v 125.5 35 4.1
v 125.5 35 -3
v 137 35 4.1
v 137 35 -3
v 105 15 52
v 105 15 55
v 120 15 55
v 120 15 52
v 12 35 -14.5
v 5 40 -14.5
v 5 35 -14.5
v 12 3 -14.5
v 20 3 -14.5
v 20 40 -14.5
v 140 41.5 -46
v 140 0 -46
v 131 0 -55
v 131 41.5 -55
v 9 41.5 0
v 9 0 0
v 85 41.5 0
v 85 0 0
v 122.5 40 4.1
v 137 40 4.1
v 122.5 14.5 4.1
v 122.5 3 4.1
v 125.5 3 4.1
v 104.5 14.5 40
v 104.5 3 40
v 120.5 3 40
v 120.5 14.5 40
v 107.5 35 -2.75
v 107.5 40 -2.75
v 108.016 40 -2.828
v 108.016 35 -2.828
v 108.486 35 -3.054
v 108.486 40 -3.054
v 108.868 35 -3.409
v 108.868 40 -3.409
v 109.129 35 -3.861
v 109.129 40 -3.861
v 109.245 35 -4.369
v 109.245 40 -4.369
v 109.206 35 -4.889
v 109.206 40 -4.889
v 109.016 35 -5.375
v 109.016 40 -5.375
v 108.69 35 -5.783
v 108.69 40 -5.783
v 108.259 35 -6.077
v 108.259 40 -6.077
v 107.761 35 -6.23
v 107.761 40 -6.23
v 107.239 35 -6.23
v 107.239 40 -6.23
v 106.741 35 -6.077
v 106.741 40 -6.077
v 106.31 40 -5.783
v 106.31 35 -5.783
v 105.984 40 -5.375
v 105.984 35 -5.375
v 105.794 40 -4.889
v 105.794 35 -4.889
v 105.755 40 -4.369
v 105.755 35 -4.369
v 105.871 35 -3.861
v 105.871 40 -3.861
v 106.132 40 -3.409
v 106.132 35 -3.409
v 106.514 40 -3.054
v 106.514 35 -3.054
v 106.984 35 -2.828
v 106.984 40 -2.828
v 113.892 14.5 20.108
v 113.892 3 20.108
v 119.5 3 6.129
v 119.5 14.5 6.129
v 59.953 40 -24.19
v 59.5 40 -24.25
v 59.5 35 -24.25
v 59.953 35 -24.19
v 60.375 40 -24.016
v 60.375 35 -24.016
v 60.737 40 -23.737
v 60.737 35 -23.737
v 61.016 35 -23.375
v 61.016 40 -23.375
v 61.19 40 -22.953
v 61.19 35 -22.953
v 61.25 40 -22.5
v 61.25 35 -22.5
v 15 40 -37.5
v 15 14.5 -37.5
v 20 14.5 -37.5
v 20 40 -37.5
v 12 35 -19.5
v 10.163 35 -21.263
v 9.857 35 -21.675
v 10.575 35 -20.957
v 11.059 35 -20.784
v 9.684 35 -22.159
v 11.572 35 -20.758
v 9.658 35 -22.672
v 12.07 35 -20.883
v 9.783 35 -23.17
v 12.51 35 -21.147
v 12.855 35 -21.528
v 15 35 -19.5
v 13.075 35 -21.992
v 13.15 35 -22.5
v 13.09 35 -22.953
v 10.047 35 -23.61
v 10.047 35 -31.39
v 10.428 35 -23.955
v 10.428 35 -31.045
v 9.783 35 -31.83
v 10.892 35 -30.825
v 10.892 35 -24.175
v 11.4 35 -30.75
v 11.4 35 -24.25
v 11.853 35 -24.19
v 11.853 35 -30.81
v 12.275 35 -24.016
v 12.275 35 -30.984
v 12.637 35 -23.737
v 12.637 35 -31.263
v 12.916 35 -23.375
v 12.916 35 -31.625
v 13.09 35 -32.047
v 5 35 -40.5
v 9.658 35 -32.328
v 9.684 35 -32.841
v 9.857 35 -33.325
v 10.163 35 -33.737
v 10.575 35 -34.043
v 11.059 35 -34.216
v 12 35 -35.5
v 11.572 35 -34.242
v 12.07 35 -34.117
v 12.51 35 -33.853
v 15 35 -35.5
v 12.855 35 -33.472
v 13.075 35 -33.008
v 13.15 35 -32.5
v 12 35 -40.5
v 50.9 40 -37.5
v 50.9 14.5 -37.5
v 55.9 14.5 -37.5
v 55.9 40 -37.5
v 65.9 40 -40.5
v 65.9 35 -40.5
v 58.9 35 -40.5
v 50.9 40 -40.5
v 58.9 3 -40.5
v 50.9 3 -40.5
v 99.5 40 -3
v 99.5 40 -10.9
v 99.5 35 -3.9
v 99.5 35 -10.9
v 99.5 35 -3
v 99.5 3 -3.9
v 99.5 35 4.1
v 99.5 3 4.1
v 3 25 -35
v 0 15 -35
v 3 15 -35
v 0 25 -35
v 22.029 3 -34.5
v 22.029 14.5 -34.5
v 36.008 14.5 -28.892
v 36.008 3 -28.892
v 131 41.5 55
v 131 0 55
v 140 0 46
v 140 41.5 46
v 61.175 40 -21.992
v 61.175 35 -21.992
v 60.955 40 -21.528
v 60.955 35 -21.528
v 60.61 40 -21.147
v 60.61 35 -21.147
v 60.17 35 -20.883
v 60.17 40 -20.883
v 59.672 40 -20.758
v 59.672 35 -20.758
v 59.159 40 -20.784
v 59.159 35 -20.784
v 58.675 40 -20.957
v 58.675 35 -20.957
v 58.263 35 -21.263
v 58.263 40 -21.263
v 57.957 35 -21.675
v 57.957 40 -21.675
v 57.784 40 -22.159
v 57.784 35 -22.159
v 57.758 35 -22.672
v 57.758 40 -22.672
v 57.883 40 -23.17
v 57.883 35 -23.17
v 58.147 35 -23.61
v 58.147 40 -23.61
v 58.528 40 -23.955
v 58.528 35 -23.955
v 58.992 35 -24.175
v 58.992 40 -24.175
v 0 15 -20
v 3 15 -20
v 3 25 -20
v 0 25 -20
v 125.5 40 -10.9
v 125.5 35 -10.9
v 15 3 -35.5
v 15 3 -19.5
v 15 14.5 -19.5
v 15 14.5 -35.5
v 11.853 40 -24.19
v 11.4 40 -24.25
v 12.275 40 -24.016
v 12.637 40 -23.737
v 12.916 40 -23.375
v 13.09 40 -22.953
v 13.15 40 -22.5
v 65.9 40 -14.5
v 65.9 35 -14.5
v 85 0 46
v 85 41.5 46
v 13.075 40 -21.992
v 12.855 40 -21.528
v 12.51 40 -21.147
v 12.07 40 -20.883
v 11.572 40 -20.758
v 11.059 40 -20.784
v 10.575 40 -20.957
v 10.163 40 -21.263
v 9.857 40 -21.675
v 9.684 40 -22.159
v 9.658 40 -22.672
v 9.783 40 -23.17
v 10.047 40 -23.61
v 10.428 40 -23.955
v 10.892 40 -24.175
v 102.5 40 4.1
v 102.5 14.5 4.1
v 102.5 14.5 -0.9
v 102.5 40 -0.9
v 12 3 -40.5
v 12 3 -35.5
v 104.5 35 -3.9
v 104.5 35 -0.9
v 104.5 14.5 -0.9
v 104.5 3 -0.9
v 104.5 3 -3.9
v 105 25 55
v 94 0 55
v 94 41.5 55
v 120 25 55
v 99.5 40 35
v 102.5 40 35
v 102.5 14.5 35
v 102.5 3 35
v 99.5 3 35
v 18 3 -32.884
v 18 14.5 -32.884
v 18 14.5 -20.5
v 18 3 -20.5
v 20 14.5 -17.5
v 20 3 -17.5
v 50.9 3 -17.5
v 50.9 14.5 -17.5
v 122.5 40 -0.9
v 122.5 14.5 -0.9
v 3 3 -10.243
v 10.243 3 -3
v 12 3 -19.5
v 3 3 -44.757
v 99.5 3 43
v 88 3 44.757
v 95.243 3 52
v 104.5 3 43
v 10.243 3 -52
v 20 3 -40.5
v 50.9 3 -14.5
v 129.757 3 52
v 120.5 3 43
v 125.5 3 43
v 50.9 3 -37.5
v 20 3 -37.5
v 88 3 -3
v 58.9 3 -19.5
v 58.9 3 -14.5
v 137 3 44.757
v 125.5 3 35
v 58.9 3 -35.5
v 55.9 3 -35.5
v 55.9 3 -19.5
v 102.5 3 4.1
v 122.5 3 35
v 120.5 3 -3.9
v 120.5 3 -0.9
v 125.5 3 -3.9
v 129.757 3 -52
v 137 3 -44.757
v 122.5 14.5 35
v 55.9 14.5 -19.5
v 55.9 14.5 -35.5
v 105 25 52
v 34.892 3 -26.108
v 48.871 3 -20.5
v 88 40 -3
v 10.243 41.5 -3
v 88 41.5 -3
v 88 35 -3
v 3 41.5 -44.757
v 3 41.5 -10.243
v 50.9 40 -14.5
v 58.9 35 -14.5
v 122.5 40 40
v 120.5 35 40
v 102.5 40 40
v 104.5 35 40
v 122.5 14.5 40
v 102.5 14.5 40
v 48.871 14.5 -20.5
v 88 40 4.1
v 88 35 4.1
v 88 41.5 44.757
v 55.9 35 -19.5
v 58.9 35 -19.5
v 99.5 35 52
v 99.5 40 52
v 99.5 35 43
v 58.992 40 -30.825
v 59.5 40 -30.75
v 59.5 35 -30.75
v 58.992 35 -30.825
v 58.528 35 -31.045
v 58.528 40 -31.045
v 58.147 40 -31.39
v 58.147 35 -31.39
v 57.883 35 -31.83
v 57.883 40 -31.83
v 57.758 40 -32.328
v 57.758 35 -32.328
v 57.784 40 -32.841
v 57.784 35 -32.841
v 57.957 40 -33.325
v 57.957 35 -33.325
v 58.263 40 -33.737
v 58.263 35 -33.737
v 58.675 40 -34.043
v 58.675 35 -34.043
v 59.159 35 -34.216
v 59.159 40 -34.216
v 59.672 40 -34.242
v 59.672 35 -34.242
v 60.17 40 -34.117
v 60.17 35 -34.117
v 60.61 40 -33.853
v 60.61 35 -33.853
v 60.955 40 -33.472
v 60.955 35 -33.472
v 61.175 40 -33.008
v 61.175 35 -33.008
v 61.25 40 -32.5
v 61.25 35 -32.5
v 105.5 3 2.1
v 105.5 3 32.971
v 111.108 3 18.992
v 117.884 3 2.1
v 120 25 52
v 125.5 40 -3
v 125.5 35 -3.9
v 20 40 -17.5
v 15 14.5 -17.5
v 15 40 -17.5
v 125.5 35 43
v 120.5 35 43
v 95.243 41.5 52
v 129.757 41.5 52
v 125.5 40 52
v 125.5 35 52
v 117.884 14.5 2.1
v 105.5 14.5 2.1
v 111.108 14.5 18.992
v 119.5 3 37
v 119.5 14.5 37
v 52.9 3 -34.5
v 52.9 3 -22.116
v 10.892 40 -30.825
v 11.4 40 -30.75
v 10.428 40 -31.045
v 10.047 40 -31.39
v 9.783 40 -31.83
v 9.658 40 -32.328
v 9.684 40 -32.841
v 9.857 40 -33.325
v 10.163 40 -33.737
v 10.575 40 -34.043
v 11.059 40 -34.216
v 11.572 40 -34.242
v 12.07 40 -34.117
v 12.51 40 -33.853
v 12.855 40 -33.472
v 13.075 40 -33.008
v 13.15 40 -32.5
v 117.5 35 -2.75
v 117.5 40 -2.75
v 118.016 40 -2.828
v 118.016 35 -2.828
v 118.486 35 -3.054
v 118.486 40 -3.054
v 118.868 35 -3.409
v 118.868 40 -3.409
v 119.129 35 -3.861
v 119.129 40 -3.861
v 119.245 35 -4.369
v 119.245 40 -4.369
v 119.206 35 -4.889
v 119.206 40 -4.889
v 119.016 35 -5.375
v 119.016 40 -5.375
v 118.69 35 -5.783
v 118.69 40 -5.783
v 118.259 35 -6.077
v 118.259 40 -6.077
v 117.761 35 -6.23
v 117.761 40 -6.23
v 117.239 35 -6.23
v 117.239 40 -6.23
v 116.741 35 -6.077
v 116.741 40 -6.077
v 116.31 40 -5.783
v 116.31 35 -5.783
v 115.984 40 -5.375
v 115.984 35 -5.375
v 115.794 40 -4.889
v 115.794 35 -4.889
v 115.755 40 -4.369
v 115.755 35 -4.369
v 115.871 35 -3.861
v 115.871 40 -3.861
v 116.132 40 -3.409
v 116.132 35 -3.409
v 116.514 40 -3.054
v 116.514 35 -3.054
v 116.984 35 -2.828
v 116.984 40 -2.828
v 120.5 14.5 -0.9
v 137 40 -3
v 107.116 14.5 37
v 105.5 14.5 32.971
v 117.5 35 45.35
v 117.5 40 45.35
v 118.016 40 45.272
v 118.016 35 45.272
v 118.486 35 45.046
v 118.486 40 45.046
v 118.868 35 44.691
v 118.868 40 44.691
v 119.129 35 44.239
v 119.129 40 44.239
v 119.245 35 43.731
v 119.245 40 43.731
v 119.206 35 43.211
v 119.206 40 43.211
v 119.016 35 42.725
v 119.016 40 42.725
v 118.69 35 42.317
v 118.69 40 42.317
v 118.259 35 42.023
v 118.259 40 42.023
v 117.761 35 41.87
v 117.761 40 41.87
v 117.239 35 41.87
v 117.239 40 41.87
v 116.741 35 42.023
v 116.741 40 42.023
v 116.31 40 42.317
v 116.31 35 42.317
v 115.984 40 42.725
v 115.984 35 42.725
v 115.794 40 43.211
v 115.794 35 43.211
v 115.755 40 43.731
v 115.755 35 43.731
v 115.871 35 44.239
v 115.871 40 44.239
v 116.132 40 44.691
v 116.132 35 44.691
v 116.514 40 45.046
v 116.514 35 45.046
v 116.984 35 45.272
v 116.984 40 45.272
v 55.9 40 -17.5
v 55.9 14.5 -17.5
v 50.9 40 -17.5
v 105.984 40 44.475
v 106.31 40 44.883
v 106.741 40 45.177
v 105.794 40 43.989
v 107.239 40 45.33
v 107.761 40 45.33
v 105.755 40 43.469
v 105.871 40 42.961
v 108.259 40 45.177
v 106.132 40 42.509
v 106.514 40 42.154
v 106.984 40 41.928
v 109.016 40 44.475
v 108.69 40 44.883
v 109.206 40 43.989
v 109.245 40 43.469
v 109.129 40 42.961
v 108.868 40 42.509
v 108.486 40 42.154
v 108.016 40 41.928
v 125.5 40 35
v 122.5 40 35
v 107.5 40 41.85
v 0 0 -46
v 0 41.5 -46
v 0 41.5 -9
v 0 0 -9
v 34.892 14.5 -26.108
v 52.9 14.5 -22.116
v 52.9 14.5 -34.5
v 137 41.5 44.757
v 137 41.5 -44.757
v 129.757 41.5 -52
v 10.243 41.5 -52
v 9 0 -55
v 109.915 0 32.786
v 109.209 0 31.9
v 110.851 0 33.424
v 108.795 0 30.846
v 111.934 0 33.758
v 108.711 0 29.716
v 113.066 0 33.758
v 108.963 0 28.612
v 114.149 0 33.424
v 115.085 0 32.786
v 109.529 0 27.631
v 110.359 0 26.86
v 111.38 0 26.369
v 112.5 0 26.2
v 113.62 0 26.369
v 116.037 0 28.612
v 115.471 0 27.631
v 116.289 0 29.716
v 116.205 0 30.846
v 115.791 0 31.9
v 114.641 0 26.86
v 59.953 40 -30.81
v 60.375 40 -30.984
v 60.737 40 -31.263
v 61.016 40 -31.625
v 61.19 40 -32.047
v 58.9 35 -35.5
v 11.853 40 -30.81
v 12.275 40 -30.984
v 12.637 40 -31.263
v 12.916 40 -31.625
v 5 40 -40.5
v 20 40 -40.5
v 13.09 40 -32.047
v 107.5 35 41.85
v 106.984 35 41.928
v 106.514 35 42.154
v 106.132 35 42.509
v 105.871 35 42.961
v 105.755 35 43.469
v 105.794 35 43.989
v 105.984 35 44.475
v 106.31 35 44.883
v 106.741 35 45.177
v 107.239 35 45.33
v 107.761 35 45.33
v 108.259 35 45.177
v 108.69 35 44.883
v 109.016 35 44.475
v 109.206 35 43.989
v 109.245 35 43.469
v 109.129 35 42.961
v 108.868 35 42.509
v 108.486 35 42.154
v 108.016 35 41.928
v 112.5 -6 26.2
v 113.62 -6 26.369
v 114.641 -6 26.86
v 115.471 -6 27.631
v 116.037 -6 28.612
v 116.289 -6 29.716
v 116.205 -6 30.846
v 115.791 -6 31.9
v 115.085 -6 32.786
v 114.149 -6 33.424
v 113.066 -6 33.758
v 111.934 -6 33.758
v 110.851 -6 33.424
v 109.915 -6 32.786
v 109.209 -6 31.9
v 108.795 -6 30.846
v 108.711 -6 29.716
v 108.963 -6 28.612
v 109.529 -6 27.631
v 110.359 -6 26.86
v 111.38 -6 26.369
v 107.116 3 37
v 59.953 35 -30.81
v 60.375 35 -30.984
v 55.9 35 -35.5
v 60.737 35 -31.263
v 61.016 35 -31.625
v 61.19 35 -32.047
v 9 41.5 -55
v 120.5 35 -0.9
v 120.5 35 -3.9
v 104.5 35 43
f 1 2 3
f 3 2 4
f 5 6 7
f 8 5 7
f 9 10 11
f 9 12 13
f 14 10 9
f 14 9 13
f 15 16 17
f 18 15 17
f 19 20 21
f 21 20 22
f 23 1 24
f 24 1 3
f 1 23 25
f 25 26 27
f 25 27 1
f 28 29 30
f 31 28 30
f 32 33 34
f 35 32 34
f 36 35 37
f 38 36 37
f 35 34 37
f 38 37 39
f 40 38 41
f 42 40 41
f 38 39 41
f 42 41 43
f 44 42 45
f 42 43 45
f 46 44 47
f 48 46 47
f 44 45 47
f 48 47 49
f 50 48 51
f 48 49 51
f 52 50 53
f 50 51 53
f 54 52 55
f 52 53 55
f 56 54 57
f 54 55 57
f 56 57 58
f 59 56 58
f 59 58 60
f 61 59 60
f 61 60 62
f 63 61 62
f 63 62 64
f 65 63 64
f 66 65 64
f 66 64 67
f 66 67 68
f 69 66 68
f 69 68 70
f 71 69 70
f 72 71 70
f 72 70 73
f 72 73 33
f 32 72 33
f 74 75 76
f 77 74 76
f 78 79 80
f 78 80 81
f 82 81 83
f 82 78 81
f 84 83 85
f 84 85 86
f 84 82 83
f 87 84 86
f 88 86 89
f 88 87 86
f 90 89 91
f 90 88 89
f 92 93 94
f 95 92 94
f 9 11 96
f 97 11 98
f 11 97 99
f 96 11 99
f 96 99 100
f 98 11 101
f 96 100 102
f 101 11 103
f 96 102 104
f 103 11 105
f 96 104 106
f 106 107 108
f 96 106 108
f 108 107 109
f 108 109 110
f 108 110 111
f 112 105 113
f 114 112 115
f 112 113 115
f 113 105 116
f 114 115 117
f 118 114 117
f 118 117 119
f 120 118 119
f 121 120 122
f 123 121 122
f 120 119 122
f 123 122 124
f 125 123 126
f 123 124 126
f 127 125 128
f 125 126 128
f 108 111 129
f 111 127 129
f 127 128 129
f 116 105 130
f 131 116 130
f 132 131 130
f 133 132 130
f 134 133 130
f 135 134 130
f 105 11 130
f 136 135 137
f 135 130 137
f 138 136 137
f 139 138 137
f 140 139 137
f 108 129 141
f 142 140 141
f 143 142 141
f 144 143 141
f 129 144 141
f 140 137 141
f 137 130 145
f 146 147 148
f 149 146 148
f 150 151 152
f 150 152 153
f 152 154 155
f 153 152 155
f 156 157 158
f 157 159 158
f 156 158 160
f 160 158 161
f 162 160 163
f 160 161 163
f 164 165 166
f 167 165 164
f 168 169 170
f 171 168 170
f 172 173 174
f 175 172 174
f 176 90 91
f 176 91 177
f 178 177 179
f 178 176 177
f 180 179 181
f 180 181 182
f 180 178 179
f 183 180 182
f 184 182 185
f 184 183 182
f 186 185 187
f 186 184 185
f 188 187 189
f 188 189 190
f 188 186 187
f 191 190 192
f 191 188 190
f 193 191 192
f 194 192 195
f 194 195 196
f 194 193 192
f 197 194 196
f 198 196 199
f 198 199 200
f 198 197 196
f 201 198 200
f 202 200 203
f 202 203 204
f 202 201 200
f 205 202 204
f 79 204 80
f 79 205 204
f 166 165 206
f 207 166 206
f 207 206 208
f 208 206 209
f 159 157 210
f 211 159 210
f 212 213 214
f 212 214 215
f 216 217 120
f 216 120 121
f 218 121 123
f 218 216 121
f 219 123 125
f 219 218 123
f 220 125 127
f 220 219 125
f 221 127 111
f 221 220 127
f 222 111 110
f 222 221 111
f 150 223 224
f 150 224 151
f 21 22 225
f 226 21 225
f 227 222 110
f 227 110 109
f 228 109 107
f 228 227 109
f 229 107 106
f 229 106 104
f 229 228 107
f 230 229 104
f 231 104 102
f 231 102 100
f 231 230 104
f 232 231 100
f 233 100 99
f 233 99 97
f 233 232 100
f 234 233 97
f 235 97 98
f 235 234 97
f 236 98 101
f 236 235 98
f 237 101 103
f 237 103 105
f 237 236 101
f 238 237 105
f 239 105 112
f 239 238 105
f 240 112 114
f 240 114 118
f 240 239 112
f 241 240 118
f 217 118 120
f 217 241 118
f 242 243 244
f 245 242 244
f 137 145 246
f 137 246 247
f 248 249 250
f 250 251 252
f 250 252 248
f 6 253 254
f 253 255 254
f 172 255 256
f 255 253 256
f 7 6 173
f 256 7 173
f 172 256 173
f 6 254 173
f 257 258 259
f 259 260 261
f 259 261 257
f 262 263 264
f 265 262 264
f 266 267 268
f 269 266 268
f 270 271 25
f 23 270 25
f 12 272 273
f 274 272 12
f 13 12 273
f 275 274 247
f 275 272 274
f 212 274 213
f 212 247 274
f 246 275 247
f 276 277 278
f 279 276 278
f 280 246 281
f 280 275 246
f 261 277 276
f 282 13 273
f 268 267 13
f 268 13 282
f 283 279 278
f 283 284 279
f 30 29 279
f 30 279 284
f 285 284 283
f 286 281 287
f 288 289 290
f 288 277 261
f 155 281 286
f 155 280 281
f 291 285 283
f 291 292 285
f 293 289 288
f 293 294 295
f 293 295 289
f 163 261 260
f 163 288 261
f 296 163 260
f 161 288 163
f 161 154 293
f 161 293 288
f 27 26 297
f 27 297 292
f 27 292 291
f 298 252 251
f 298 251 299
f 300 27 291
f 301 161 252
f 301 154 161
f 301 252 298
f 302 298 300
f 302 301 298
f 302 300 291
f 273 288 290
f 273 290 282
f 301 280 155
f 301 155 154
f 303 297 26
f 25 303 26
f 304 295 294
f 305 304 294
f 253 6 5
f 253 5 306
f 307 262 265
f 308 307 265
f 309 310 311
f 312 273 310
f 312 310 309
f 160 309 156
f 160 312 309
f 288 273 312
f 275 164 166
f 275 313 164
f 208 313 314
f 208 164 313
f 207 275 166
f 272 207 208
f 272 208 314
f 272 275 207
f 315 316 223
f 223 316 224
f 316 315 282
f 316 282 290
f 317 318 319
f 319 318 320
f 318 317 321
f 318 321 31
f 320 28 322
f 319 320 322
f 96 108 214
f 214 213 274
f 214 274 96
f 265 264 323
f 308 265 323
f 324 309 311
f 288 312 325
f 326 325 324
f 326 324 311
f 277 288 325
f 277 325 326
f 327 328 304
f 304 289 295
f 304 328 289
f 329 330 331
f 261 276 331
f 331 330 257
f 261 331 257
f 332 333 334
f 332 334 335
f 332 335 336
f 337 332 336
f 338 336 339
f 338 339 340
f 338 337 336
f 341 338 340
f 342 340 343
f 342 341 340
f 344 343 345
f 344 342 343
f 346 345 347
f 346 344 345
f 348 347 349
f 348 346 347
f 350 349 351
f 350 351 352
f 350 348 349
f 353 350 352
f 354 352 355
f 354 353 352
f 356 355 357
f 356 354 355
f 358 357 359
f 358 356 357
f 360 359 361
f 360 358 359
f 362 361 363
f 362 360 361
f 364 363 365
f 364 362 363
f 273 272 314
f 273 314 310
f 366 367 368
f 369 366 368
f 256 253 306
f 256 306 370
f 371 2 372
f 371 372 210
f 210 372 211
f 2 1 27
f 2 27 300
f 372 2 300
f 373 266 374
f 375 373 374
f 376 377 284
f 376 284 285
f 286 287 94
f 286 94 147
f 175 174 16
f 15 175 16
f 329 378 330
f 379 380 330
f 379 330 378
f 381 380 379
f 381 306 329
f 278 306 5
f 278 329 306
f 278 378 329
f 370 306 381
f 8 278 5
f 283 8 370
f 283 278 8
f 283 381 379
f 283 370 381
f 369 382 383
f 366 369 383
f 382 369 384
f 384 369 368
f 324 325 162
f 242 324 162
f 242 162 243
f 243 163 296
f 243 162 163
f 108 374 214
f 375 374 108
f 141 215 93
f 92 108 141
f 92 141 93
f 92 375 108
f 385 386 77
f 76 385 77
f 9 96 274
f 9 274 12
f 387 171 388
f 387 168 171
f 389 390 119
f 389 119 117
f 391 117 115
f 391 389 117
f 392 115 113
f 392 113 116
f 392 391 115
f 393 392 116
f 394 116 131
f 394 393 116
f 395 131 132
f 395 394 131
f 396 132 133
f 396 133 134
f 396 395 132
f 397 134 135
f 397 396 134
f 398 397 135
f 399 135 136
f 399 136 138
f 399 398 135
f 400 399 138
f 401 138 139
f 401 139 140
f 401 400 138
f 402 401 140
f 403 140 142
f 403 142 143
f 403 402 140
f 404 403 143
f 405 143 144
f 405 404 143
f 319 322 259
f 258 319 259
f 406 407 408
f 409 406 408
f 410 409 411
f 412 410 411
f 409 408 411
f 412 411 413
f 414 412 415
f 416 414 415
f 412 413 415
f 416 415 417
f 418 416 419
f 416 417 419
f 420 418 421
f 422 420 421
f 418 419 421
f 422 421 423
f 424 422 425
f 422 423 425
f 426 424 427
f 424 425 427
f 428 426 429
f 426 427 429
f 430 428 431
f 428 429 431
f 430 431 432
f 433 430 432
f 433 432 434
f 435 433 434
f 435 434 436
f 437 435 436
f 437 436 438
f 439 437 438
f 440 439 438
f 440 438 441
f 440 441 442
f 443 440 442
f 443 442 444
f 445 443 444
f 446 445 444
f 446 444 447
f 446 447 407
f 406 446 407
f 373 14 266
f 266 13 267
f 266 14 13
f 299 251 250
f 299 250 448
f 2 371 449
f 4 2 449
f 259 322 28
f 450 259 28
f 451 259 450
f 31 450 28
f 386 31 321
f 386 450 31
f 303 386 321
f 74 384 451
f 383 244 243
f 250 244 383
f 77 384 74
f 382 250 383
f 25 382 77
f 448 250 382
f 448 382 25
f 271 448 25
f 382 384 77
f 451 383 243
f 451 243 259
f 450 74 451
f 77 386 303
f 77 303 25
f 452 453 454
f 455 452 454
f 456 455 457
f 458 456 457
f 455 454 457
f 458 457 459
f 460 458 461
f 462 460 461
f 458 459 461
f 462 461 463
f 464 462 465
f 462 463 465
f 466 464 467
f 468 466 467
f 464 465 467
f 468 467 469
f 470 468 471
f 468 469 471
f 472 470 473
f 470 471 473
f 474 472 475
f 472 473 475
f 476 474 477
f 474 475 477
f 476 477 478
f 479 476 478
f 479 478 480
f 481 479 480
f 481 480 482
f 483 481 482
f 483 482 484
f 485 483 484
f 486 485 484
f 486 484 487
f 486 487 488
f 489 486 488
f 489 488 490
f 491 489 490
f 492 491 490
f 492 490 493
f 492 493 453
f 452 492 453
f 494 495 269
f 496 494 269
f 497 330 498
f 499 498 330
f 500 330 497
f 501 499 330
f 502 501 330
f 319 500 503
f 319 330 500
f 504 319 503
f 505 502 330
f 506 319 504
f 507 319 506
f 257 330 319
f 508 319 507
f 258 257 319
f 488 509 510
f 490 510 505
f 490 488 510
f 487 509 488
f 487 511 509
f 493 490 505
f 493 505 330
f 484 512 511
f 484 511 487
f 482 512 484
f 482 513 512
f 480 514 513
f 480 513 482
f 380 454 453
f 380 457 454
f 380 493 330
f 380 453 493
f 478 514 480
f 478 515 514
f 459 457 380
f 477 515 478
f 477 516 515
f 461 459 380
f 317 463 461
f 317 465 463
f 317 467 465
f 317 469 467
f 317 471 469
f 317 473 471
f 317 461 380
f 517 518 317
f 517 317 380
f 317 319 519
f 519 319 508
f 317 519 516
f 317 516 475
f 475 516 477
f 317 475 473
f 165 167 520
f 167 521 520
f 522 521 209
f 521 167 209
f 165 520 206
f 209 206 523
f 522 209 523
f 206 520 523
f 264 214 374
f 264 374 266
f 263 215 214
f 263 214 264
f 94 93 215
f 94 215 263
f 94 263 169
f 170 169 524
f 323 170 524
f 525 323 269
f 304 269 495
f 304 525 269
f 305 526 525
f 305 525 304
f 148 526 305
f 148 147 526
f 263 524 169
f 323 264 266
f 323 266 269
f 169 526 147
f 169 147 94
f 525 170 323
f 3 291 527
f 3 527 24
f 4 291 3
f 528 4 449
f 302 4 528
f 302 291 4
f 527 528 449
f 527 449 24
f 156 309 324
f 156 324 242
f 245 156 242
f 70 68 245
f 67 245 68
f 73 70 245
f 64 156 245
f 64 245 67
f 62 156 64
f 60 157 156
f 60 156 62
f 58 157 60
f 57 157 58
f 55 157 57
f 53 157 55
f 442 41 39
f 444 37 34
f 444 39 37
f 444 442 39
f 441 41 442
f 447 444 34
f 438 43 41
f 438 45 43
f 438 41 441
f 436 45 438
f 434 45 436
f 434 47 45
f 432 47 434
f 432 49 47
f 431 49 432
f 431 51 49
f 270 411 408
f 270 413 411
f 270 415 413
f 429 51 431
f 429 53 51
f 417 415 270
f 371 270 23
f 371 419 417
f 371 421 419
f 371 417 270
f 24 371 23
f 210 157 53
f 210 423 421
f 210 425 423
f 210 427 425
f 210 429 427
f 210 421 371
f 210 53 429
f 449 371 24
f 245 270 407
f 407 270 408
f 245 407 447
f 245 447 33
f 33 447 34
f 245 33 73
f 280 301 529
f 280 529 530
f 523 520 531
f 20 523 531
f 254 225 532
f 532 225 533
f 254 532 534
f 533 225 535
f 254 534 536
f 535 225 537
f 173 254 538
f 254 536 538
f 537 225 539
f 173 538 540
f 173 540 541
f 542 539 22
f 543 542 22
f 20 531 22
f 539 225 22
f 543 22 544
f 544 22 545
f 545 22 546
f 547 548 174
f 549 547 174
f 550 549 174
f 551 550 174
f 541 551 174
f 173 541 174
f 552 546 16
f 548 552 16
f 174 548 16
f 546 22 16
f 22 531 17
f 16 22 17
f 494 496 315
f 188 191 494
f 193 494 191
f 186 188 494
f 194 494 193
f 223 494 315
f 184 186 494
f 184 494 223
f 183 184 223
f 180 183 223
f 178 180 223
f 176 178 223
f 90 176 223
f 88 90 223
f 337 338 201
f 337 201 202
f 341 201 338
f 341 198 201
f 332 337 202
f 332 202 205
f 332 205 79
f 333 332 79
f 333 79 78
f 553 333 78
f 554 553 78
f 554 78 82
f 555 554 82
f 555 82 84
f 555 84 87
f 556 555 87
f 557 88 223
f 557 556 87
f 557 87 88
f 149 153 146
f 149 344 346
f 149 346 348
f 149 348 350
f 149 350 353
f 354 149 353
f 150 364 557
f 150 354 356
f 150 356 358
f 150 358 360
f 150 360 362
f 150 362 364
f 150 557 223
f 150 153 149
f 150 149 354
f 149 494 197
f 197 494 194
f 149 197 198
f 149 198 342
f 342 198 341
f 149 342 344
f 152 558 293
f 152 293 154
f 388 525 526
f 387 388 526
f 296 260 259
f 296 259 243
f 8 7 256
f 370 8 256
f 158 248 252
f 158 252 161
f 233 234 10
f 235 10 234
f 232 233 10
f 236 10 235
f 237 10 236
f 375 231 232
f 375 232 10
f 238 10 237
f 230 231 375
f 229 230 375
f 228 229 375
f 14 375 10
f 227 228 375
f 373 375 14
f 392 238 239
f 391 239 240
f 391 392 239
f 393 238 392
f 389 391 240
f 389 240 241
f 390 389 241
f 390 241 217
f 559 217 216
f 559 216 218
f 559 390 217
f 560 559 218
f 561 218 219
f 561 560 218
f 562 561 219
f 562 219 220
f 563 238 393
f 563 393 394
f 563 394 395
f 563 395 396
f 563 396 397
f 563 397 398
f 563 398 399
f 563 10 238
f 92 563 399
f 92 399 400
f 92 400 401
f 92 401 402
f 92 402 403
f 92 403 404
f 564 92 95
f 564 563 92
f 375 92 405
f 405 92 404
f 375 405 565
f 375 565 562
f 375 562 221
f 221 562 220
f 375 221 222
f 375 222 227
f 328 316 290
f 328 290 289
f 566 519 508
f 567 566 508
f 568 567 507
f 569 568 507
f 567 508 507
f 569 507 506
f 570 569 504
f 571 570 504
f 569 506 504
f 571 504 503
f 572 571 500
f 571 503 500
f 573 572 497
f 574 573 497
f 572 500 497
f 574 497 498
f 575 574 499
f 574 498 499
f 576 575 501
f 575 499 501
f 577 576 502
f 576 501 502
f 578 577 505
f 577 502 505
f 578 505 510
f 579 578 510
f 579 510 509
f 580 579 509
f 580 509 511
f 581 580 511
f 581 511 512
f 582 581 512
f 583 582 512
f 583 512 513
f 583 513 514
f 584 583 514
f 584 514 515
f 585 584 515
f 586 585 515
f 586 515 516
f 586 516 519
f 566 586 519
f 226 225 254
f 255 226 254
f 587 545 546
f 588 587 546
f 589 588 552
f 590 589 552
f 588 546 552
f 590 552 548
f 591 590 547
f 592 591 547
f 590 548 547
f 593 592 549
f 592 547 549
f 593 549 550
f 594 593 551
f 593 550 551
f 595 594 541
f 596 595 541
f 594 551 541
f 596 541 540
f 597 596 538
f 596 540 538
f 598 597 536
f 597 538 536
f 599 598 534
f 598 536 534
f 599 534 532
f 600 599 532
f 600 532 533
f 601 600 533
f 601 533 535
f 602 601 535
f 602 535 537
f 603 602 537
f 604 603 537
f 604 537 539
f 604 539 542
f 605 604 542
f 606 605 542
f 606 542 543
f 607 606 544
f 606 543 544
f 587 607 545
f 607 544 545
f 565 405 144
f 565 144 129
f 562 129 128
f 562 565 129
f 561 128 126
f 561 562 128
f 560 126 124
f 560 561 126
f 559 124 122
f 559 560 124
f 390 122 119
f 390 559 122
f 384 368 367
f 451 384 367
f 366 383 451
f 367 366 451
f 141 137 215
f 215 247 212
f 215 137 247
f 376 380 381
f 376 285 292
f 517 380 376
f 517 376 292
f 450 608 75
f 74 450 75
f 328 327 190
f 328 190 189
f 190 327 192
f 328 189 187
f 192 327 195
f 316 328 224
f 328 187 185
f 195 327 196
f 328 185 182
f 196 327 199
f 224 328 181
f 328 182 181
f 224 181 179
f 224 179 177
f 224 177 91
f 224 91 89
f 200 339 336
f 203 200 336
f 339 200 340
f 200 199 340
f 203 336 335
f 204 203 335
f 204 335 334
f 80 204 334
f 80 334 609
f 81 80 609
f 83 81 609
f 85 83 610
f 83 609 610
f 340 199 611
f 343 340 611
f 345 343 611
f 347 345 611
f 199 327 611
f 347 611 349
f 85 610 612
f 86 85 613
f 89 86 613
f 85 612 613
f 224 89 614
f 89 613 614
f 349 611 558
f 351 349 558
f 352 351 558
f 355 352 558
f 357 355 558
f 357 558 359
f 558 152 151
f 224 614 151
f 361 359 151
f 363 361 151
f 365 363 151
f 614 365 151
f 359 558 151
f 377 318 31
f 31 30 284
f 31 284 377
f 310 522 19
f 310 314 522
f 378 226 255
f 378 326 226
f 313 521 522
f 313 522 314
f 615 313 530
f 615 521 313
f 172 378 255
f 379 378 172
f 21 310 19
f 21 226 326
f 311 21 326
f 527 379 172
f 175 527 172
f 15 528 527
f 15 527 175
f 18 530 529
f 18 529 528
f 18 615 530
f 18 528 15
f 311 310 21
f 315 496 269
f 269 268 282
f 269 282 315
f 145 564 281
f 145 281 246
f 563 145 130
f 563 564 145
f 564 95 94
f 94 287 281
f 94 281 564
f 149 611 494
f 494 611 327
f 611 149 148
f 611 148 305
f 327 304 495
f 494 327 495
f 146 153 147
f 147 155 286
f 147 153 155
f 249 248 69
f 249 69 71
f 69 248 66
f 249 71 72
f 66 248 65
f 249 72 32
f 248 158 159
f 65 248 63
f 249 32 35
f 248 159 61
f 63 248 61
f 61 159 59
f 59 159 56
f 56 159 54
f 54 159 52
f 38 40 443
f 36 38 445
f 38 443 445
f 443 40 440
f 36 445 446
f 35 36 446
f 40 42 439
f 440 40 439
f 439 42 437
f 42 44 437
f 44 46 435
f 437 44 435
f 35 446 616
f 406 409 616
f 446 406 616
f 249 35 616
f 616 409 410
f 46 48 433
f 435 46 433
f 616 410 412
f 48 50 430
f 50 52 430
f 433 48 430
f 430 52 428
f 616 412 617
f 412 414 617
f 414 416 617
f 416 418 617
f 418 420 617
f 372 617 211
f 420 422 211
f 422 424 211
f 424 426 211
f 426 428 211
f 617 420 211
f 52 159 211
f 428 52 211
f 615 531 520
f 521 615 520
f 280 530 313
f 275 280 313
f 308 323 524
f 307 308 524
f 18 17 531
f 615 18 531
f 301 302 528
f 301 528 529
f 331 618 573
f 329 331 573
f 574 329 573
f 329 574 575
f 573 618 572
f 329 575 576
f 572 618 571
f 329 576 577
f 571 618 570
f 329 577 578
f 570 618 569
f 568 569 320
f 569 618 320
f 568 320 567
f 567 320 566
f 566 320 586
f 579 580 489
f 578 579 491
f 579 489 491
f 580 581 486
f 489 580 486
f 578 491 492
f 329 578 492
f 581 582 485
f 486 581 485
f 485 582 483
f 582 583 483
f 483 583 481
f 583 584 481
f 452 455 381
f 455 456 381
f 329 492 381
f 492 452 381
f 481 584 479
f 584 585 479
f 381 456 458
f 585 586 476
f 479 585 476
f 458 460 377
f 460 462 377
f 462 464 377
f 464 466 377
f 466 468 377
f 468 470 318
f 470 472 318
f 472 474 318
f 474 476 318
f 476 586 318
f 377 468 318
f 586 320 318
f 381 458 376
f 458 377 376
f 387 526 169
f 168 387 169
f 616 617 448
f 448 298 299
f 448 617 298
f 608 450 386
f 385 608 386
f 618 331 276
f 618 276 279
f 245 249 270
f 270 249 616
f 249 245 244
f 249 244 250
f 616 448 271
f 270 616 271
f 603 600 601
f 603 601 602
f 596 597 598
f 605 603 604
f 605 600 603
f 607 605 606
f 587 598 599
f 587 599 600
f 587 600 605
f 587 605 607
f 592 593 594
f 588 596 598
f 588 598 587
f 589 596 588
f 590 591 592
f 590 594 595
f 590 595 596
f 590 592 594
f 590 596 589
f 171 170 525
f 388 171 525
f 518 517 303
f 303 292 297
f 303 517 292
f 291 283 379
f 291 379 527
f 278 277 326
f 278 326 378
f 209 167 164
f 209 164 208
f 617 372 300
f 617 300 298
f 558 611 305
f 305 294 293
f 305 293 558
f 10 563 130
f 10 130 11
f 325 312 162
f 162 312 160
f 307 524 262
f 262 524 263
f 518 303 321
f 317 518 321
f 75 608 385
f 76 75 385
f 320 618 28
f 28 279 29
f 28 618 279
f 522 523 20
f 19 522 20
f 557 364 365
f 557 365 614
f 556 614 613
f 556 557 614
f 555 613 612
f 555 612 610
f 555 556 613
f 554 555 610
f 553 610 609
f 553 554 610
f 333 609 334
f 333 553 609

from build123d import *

# Parameters (mm, degrees)
BOSS_EXTRUDE1_DEPTH     = 55
SHELL1_START            = 3
SHELL1_DEPTH            = 49
CUT_EXTRUDE1_DEPTH      = 161.15617378
CUT_EXTRUDE1_DEPTH_BACK = 161.15617378
SKETCH4_W               = 154.651671352
SKETCH4_H               = 22.597591031
SKETCH6_R               = 3.8
BOSS_EXTRUDE2_DEPTH     = 6
BOSS_EXTRUDE3_DEPTH     = 37
SKETCH9_W               = 26
SKETCH9_H               = 10
BOSS_EXTRUDE4_DEPTH     = 5
CUT_EXTRUDE3_REACH      = 159.293
SKETCH10_R              = 1.75
SKETCH11_W              = 26
SKETCH11_H              = 2
SKETCH11_W_2            = 11.5
SKETCH11_H_2            = 7.1
BOSS_EXTRUDE5_DEPTH     = 5
CUT_EXTRUDE4_REACH      = 184.818
SKETCH12_W              = 15
SKETCH12_H              = 10
SKETCH13_W              = 20
SKETCH13_H              = 40.9
BOSS_EXTRUDE6_DEPTH     = 11.5
CUT_EXTRUDE5_DEPTH      = 11.5
BOSS_EXTRUDE7_DEPTH     = 11.5
CUT_EXTRUDE6_REACH      = 158.036
SKETCH16_W              = 15
SKETCH16_H              = 10
BOSS_EXTRUDE8_DEPTH     = 37
BOSS_EXTRUDE9_DEPTH     = 5
SKETCH20_W              = 40.9
SKETCH20_H              = 20
BOSS_EXTRUDE10_DEPTH    = 11.5
CUT_EXTRUDE7_DEPTH      = 11.5


# Read off the part's stored shape, not the designer's step: Shell1
with BuildPart() as part:
    # Sketch2 → Boss-Extrude1 (new body)
    with BuildSketch(Plane(origin=(0, 0, 0), x_dir=(1, 0, 0), z_dir=(0, 1, 0))):
        Polygon((9, 55), (0, 46), (0, 9), (9, 0), (85, 0), (140, 0), (140, 46), (131, 55), align=None)
        Polygon((140, 0), (85, 0), (85, -46), (94, -55), (131, -55), (140, -46), align=None)
    extrude(amount=BOSS_EXTRUDE1_DEPTH)

    # Shell1 outline → Shell1 (cut)
    with BuildSketch(Plane(origin=(0, 0, 0), x_dir=(1, 0, 0), z_dir=(0, 1, 0)).offset(SHELL1_START)):
        Polygon((10.242640687, 3), (88, 3), (88, -44.757359313), (95.242640687, -52), (129.757359313, -52), (137, -44.757359313), (137, 44.757359313), (129.757359313, 52), (10.242640687, 52), (3, 44.757359313), (3, 10.242640687), align=None)
    extrude(amount=SHELL1_DEPTH, mode=Mode.SUBTRACT)

    # Sketch4 → Cut-Extrude1 (cut, two sides: drawn at the far end of the back side and taken through both)
    with BuildSketch(Plane.XY.offset(-CUT_EXTRUDE1_DEPTH_BACK)):
        with Locations((70, 52.798795516)):
            Rectangle(SKETCH4_W, SKETCH4_H)
    extrude(amount=CUT_EXTRUDE1_DEPTH + CUT_EXTRUDE1_DEPTH_BACK, mode=Mode.SUBTRACT)

    # Sketch6 → Boss-Extrude2 (add)
    with BuildSketch(Plane.XZ):
        with Locations(Location((112.5, 30, 0), (0, 0, 270))):
            Circle(SKETCH6_R)
    extrude(amount=BOSS_EXTRUDE2_DEPTH)

    # Sketch8 → Boss-Extrude3 (add)
    with BuildSketch(Plane(origin=(0, 3, 0), x_dir=(1, 0, 0), z_dir=(0, 1, 0))):
        Polygon((102.5, -35), (99.5, -35), (99.5, -43), (104.5, -43), (104.5, -40), (102.5, -40), align=None)
        Polygon((99.5, 3.9), (99.5, -4.1), (102.5, -4.1), (102.5, 0.9), (104.5, 0.9), (104.5, 3.9), align=None)
        Polygon((120.5, -40), (120.5, -43), (125.5, -43), (125.5, -35), (122.5, -35), (122.5, -40), align=None)
        Polygon((125.5, 3.9), (120.5, 3.9), (120.5, 0.9), (122.5, 0.9), (122.5, -4.1), (125.5, -4.1), align=None)
    extrude(amount=BOSS_EXTRUDE3_DEPTH)

    # Sketch9 → Boss-Extrude4 (add)
    with BuildSketch(Plane(origin=(0, 40, 0), x_dir=(1, 0, 0), z_dir=(0, 1, 0))):
        with Locations((112.5, 5.9)):
            Rectangle(SKETCH9_W, SKETCH9_H)
        with Locations((112.5, -45)):
            Rectangle(SKETCH9_W, SKETCH9_H)
    extrude(amount=-BOSS_EXTRUDE4_DEPTH)

    # Sketch10 → Cut-Extrude3 (cut, up to next)
    with BuildSketch(Plane(origin=(0, 40, 0), x_dir=(1, 0, 0), z_dir=(0, 1, 0)), mode=Mode.PRIVATE) as cut_extrude3_sk1:
        with Locations(Location((107.5, 4.5, 0), (0, 0, 270))):
            Circle(SKETCH10_R)
    cut_extrude3_tool1 = extrude(cut_extrude3_sk1.sketch, amount=-CUT_EXTRUDE3_REACH, mode=Mode.PRIVATE) & part.part
    # Sketch10 → Cut-Extrude3 (cut, up to next)
    with BuildSketch(Plane(origin=(0, 40, 0), x_dir=(1, 0, 0), z_dir=(0, 1, 0)), mode=Mode.PRIVATE) as cut_extrude3_sk2:
        with Locations(Location((117.5, 4.5, 0), (0, 0, 270))):
            Circle(SKETCH10_R)
    cut_extrude3_tool2 = extrude(cut_extrude3_sk2.sketch, amount=-CUT_EXTRUDE3_REACH, mode=Mode.PRIVATE) & part.part
    # Sketch10 → Cut-Extrude3 (cut, up to next)
    with BuildSketch(Plane(origin=(0, 40, 0), x_dir=(1, 0, 0), z_dir=(0, 1, 0)), mode=Mode.PRIVATE) as cut_extrude3_sk3:
        with Locations(Location((117.5, -43.6, 0), (0, 0, 270))):
            Circle(SKETCH10_R)
    cut_extrude3_tool3 = extrude(cut_extrude3_sk3.sketch, amount=-CUT_EXTRUDE3_REACH, mode=Mode.PRIVATE) & part.part
    # Sketch10 → Cut-Extrude3 (cut, up to next)
    with BuildSketch(Plane(origin=(0, 40, 0), x_dir=(1, 0, 0), z_dir=(0, 1, 0)), mode=Mode.PRIVATE) as cut_extrude3_sk4:
        with Locations(Location((107.5, -43.6, 0), (0, 0, 90))):
            Circle(SKETCH10_R)
    cut_extrude3_tool4 = extrude(cut_extrude3_sk4.sketch, amount=-CUT_EXTRUDE3_REACH, mode=Mode.PRIVATE) & part.part
    add(cut_extrude3_tool1.solids().sort_by_distance((107.5, 40, -4.5))[0], mode=Mode.SUBTRACT)
    add(cut_extrude3_tool2.solids().sort_by_distance((117.5, 40, -4.5))[0], mode=Mode.SUBTRACT)
    add(cut_extrude3_tool3.solids().sort_by_distance((117.5, 40, 43.6))[0], mode=Mode.SUBTRACT)
    add(cut_extrude3_tool4.solids().sort_by_distance((107.5, 40, 43.6))[0], mode=Mode.SUBTRACT)

    # Sketch11 → Boss-Extrude5 (add)
    with BuildSketch(Plane(origin=(0, 40, 0), x_dir=(1, 0, 0), z_dir=(0, 1, 0))):
        with Locations((112.5, -51)):
            Rectangle(SKETCH11_W, SKETCH11_H)
        with Locations((93.75, -0.55)):
            Rectangle(SKETCH11_W_2, SKETCH11_H_2)
        with Locations((131.25, -0.55)):
            Rectangle(SKETCH11_W_2, SKETCH11_H_2)
    extrude(amount=-BOSS_EXTRUDE5_DEPTH)

    # Sketch12 → Cut-Extrude4 (cut, up to next)
    with BuildSketch(Plane.XY.offset(55), mode=Mode.PRIVATE) as cut_extrude4_sk1:
        with Locations((112.5, 20)):
            Rectangle(SKETCH12_W, SKETCH12_H)
    cut_extrude4_tool1 = extrude(cut_extrude4_sk1.sketch, amount=-CUT_EXTRUDE4_REACH, mode=Mode.PRIVATE) & part.part
    add(cut_extrude4_tool1.solids().sort_by_distance((112.5, 20, 55))[0], mode=Mode.SUBTRACT)

    # Sketch13 → Boss-Extrude6 (add)
    with BuildSketch(Plane(origin=(0, 3, 0), x_dir=(1, 0, 0), z_dir=(0, 1, 0))):
        with Locations((112.5, -19.55)):
            Rectangle(SKETCH13_W, SKETCH13_H)
    extrude(amount=BOSS_EXTRUDE6_DEPTH)

    # Sketch14 → Cut-Extrude5 (cut)
    with BuildSketch(Plane(origin=(0, 14.5, 0), x_dir=(1, 0, 0), z_dir=(0, 1, 0))):
        Polygon((105.5, -2.1), (105.5, -4.1), (105.5, -35), (105.5, -37), (119.5, -37), (119.5, -35), (119.5, -4.1), (119.5, -2.1), align=None)
    extrude(amount=-CUT_EXTRUDE5_DEPTH, mode=Mode.SUBTRACT)

    # Sketch15 → Boss-Extrude7 (add)
    with BuildSketch(Plane(origin=(0, 3, 0), x_dir=(1, 0, 0), z_dir=(0, 1, 0))):
        Polygon((112.5, -19.55), (119.5, -2.1), (117.883811276, -2.1), (111.107835851, -18.991538737), align=None)
        Polygon((119.5, -6.128927606), (119.5, -2.1), (112.5, -19.55), (113.892164149, -20.108461263), align=None)
        Polygon((105.5, -37), (112.5, -19.55), (111.107835851, -18.991538737), (105.5, -32.971072394), align=None)
        Polygon((113.892164149, -20.108461263), (112.5, -19.55), (105.5, -37), (107.116188724, -37), align=None)
    extrude(amount=BOSS_EXTRUDE7_DEPTH)

    # Sketch16 → Cut-Extrude6 (cut, up to next)
    with BuildSketch(Plane.ZY, mode=Mode.PRIVATE) as cut_extrude6_sk1:
        with Locations((-27.5, 20)):
            Rectangle(SKETCH16_W, SKETCH16_H)
    cut_extrude6_tool1 = extrude(cut_extrude6_sk1.sketch, amount=-CUT_EXTRUDE6_REACH, mode=Mode.PRIVATE) & part.part
    add(cut_extrude6_tool1.solids().sort_by_distance((0, 20, -27.5))[0], mode=Mode.SUBTRACT)

    # Sketch18 → Boss-Extrude8 (add)
    with BuildSketch(Plane(origin=(0, 3, 0), x_dir=(1, 0, 0), z_dir=(0, 1, 0))):
        Polygon((15, 37.5), (20, 37.5), (20, 40.5), (12, 40.5), (12, 35.5), (15, 35.5), align=None)
        Polygon((55.9, 37.5), (55.9, 35.5), (58.9, 35.5), (58.9, 40.5), (50.9, 40.5), (50.9, 37.5), align=None)
        Polygon((55.9, 19.5), (55.9, 17.5), (50.9, 17.5), (50.9, 14.5), (58.9, 14.5), (58.9, 19.5), align=None)
        Polygon((20, 14.5), (20, 17.5), (15, 17.5), (15, 19.5), (12, 19.5), (12, 14.5), align=None)
    extrude(amount=BOSS_EXTRUDE8_DEPTH)

    # Sketch19 → Boss-Extrude9 (add)
    # profile 1 of 3: a face of its own
    with BuildSketch(Plane(origin=(0, 40, 0), x_dir=(1, 0, 0), z_dir=(0, 1, 0))):
        Polygon((12, 35.5), (12, 40.5), (5, 40.5), (5, 14.5), (12, 14.5), (12, 19.5), (15, 19.5), (15, 35.5), align=None)
        with BuildLine():
            ThreePointArc((13.15, 22.5), (10.162563133, 21.262563133), (11.4, 24.25))
            ThreePointArc((11.4, 24.25), (12.637436867, 23.737436867), (13.15, 22.5))
        make_face(mode=Mode.SUBTRACT)
        with BuildLine():
            ThreePointArc((13.15, 32.5), (12.637436867, 31.262563133), (11.4, 30.75))
            ThreePointArc((11.4, 30.75), (10.162563133, 33.737436867), (13.15, 32.5))
        make_face(mode=Mode.SUBTRACT)
    # profile 2 of 3: a face of its own
    with BuildSketch(Plane(origin=(0, 40, 0), x_dir=(1, 0, 0), z_dir=(0, 1, 0))):
        Polygon((15, 37.5), (15, 40.5), (12, 40.5), (12, 35.5), (15, 35.5), align=None)
    # profile 3 of 3: a face of its own
    with BuildSketch(Plane(origin=(0, 40, 0), x_dir=(1, 0, 0), z_dir=(0, 1, 0))):
        Polygon((58.9, 19.5), (58.9, 14.5), (65.9, 14.5), (65.9, 40.5), (58.9, 40.5), (58.9, 35.5), (55.9, 35.5), (55.9, 19.5), align=None)
        with BuildLine():
            ThreePointArc((61.25, 22.5), (58.262563133, 21.262563133), (59.5, 24.25))
            ThreePointArc((59.5, 24.25), (60.737436867, 23.737436867), (61.25, 22.5))
        make_face(mode=Mode.SUBTRACT)
        with BuildLine():
            ThreePointArc((61.25, 32.5), (60.737436867, 31.262563133), (59.5, 30.75))
            ThreePointArc((59.5, 30.75), (58.262563133, 33.737436867), (61.25, 32.5))
        make_face(mode=Mode.SUBTRACT)
    extrude(amount=-BOSS_EXTRUDE9_DEPTH)

    # Sketch20 → Boss-Extrude10 (add)
    with BuildSketch(Plane(origin=(0, 3, 0), x_dir=(1, 0, 0), z_dir=(0, 1, 0))):
        with Locations((35.45, 27.5)):
            Rectangle(SKETCH20_W, SKETCH20_H)
    extrude(amount=BOSS_EXTRUDE10_DEPTH)

    # Sketch21 → Cut-Extrude7 (cut)
    with BuildSketch(Plane(origin=(0, 14.5, 0), x_dir=(1, 0, 0), z_dir=(0, 1, 0))):
        Polygon((18, 32.883811276), (18, 20.5), (48.871072394, 20.5), (34.891538737, 26.107835851), align=None)
        Polygon((52.9, 34.5), (22.028927606, 34.5), (36.008461263, 28.892164149), (52.9, 22.116188724), align=None)
    extrude(amount=-CUT_EXTRUDE7_DEPTH, mode=Mode.SUBTRACT)


solid = part.part
